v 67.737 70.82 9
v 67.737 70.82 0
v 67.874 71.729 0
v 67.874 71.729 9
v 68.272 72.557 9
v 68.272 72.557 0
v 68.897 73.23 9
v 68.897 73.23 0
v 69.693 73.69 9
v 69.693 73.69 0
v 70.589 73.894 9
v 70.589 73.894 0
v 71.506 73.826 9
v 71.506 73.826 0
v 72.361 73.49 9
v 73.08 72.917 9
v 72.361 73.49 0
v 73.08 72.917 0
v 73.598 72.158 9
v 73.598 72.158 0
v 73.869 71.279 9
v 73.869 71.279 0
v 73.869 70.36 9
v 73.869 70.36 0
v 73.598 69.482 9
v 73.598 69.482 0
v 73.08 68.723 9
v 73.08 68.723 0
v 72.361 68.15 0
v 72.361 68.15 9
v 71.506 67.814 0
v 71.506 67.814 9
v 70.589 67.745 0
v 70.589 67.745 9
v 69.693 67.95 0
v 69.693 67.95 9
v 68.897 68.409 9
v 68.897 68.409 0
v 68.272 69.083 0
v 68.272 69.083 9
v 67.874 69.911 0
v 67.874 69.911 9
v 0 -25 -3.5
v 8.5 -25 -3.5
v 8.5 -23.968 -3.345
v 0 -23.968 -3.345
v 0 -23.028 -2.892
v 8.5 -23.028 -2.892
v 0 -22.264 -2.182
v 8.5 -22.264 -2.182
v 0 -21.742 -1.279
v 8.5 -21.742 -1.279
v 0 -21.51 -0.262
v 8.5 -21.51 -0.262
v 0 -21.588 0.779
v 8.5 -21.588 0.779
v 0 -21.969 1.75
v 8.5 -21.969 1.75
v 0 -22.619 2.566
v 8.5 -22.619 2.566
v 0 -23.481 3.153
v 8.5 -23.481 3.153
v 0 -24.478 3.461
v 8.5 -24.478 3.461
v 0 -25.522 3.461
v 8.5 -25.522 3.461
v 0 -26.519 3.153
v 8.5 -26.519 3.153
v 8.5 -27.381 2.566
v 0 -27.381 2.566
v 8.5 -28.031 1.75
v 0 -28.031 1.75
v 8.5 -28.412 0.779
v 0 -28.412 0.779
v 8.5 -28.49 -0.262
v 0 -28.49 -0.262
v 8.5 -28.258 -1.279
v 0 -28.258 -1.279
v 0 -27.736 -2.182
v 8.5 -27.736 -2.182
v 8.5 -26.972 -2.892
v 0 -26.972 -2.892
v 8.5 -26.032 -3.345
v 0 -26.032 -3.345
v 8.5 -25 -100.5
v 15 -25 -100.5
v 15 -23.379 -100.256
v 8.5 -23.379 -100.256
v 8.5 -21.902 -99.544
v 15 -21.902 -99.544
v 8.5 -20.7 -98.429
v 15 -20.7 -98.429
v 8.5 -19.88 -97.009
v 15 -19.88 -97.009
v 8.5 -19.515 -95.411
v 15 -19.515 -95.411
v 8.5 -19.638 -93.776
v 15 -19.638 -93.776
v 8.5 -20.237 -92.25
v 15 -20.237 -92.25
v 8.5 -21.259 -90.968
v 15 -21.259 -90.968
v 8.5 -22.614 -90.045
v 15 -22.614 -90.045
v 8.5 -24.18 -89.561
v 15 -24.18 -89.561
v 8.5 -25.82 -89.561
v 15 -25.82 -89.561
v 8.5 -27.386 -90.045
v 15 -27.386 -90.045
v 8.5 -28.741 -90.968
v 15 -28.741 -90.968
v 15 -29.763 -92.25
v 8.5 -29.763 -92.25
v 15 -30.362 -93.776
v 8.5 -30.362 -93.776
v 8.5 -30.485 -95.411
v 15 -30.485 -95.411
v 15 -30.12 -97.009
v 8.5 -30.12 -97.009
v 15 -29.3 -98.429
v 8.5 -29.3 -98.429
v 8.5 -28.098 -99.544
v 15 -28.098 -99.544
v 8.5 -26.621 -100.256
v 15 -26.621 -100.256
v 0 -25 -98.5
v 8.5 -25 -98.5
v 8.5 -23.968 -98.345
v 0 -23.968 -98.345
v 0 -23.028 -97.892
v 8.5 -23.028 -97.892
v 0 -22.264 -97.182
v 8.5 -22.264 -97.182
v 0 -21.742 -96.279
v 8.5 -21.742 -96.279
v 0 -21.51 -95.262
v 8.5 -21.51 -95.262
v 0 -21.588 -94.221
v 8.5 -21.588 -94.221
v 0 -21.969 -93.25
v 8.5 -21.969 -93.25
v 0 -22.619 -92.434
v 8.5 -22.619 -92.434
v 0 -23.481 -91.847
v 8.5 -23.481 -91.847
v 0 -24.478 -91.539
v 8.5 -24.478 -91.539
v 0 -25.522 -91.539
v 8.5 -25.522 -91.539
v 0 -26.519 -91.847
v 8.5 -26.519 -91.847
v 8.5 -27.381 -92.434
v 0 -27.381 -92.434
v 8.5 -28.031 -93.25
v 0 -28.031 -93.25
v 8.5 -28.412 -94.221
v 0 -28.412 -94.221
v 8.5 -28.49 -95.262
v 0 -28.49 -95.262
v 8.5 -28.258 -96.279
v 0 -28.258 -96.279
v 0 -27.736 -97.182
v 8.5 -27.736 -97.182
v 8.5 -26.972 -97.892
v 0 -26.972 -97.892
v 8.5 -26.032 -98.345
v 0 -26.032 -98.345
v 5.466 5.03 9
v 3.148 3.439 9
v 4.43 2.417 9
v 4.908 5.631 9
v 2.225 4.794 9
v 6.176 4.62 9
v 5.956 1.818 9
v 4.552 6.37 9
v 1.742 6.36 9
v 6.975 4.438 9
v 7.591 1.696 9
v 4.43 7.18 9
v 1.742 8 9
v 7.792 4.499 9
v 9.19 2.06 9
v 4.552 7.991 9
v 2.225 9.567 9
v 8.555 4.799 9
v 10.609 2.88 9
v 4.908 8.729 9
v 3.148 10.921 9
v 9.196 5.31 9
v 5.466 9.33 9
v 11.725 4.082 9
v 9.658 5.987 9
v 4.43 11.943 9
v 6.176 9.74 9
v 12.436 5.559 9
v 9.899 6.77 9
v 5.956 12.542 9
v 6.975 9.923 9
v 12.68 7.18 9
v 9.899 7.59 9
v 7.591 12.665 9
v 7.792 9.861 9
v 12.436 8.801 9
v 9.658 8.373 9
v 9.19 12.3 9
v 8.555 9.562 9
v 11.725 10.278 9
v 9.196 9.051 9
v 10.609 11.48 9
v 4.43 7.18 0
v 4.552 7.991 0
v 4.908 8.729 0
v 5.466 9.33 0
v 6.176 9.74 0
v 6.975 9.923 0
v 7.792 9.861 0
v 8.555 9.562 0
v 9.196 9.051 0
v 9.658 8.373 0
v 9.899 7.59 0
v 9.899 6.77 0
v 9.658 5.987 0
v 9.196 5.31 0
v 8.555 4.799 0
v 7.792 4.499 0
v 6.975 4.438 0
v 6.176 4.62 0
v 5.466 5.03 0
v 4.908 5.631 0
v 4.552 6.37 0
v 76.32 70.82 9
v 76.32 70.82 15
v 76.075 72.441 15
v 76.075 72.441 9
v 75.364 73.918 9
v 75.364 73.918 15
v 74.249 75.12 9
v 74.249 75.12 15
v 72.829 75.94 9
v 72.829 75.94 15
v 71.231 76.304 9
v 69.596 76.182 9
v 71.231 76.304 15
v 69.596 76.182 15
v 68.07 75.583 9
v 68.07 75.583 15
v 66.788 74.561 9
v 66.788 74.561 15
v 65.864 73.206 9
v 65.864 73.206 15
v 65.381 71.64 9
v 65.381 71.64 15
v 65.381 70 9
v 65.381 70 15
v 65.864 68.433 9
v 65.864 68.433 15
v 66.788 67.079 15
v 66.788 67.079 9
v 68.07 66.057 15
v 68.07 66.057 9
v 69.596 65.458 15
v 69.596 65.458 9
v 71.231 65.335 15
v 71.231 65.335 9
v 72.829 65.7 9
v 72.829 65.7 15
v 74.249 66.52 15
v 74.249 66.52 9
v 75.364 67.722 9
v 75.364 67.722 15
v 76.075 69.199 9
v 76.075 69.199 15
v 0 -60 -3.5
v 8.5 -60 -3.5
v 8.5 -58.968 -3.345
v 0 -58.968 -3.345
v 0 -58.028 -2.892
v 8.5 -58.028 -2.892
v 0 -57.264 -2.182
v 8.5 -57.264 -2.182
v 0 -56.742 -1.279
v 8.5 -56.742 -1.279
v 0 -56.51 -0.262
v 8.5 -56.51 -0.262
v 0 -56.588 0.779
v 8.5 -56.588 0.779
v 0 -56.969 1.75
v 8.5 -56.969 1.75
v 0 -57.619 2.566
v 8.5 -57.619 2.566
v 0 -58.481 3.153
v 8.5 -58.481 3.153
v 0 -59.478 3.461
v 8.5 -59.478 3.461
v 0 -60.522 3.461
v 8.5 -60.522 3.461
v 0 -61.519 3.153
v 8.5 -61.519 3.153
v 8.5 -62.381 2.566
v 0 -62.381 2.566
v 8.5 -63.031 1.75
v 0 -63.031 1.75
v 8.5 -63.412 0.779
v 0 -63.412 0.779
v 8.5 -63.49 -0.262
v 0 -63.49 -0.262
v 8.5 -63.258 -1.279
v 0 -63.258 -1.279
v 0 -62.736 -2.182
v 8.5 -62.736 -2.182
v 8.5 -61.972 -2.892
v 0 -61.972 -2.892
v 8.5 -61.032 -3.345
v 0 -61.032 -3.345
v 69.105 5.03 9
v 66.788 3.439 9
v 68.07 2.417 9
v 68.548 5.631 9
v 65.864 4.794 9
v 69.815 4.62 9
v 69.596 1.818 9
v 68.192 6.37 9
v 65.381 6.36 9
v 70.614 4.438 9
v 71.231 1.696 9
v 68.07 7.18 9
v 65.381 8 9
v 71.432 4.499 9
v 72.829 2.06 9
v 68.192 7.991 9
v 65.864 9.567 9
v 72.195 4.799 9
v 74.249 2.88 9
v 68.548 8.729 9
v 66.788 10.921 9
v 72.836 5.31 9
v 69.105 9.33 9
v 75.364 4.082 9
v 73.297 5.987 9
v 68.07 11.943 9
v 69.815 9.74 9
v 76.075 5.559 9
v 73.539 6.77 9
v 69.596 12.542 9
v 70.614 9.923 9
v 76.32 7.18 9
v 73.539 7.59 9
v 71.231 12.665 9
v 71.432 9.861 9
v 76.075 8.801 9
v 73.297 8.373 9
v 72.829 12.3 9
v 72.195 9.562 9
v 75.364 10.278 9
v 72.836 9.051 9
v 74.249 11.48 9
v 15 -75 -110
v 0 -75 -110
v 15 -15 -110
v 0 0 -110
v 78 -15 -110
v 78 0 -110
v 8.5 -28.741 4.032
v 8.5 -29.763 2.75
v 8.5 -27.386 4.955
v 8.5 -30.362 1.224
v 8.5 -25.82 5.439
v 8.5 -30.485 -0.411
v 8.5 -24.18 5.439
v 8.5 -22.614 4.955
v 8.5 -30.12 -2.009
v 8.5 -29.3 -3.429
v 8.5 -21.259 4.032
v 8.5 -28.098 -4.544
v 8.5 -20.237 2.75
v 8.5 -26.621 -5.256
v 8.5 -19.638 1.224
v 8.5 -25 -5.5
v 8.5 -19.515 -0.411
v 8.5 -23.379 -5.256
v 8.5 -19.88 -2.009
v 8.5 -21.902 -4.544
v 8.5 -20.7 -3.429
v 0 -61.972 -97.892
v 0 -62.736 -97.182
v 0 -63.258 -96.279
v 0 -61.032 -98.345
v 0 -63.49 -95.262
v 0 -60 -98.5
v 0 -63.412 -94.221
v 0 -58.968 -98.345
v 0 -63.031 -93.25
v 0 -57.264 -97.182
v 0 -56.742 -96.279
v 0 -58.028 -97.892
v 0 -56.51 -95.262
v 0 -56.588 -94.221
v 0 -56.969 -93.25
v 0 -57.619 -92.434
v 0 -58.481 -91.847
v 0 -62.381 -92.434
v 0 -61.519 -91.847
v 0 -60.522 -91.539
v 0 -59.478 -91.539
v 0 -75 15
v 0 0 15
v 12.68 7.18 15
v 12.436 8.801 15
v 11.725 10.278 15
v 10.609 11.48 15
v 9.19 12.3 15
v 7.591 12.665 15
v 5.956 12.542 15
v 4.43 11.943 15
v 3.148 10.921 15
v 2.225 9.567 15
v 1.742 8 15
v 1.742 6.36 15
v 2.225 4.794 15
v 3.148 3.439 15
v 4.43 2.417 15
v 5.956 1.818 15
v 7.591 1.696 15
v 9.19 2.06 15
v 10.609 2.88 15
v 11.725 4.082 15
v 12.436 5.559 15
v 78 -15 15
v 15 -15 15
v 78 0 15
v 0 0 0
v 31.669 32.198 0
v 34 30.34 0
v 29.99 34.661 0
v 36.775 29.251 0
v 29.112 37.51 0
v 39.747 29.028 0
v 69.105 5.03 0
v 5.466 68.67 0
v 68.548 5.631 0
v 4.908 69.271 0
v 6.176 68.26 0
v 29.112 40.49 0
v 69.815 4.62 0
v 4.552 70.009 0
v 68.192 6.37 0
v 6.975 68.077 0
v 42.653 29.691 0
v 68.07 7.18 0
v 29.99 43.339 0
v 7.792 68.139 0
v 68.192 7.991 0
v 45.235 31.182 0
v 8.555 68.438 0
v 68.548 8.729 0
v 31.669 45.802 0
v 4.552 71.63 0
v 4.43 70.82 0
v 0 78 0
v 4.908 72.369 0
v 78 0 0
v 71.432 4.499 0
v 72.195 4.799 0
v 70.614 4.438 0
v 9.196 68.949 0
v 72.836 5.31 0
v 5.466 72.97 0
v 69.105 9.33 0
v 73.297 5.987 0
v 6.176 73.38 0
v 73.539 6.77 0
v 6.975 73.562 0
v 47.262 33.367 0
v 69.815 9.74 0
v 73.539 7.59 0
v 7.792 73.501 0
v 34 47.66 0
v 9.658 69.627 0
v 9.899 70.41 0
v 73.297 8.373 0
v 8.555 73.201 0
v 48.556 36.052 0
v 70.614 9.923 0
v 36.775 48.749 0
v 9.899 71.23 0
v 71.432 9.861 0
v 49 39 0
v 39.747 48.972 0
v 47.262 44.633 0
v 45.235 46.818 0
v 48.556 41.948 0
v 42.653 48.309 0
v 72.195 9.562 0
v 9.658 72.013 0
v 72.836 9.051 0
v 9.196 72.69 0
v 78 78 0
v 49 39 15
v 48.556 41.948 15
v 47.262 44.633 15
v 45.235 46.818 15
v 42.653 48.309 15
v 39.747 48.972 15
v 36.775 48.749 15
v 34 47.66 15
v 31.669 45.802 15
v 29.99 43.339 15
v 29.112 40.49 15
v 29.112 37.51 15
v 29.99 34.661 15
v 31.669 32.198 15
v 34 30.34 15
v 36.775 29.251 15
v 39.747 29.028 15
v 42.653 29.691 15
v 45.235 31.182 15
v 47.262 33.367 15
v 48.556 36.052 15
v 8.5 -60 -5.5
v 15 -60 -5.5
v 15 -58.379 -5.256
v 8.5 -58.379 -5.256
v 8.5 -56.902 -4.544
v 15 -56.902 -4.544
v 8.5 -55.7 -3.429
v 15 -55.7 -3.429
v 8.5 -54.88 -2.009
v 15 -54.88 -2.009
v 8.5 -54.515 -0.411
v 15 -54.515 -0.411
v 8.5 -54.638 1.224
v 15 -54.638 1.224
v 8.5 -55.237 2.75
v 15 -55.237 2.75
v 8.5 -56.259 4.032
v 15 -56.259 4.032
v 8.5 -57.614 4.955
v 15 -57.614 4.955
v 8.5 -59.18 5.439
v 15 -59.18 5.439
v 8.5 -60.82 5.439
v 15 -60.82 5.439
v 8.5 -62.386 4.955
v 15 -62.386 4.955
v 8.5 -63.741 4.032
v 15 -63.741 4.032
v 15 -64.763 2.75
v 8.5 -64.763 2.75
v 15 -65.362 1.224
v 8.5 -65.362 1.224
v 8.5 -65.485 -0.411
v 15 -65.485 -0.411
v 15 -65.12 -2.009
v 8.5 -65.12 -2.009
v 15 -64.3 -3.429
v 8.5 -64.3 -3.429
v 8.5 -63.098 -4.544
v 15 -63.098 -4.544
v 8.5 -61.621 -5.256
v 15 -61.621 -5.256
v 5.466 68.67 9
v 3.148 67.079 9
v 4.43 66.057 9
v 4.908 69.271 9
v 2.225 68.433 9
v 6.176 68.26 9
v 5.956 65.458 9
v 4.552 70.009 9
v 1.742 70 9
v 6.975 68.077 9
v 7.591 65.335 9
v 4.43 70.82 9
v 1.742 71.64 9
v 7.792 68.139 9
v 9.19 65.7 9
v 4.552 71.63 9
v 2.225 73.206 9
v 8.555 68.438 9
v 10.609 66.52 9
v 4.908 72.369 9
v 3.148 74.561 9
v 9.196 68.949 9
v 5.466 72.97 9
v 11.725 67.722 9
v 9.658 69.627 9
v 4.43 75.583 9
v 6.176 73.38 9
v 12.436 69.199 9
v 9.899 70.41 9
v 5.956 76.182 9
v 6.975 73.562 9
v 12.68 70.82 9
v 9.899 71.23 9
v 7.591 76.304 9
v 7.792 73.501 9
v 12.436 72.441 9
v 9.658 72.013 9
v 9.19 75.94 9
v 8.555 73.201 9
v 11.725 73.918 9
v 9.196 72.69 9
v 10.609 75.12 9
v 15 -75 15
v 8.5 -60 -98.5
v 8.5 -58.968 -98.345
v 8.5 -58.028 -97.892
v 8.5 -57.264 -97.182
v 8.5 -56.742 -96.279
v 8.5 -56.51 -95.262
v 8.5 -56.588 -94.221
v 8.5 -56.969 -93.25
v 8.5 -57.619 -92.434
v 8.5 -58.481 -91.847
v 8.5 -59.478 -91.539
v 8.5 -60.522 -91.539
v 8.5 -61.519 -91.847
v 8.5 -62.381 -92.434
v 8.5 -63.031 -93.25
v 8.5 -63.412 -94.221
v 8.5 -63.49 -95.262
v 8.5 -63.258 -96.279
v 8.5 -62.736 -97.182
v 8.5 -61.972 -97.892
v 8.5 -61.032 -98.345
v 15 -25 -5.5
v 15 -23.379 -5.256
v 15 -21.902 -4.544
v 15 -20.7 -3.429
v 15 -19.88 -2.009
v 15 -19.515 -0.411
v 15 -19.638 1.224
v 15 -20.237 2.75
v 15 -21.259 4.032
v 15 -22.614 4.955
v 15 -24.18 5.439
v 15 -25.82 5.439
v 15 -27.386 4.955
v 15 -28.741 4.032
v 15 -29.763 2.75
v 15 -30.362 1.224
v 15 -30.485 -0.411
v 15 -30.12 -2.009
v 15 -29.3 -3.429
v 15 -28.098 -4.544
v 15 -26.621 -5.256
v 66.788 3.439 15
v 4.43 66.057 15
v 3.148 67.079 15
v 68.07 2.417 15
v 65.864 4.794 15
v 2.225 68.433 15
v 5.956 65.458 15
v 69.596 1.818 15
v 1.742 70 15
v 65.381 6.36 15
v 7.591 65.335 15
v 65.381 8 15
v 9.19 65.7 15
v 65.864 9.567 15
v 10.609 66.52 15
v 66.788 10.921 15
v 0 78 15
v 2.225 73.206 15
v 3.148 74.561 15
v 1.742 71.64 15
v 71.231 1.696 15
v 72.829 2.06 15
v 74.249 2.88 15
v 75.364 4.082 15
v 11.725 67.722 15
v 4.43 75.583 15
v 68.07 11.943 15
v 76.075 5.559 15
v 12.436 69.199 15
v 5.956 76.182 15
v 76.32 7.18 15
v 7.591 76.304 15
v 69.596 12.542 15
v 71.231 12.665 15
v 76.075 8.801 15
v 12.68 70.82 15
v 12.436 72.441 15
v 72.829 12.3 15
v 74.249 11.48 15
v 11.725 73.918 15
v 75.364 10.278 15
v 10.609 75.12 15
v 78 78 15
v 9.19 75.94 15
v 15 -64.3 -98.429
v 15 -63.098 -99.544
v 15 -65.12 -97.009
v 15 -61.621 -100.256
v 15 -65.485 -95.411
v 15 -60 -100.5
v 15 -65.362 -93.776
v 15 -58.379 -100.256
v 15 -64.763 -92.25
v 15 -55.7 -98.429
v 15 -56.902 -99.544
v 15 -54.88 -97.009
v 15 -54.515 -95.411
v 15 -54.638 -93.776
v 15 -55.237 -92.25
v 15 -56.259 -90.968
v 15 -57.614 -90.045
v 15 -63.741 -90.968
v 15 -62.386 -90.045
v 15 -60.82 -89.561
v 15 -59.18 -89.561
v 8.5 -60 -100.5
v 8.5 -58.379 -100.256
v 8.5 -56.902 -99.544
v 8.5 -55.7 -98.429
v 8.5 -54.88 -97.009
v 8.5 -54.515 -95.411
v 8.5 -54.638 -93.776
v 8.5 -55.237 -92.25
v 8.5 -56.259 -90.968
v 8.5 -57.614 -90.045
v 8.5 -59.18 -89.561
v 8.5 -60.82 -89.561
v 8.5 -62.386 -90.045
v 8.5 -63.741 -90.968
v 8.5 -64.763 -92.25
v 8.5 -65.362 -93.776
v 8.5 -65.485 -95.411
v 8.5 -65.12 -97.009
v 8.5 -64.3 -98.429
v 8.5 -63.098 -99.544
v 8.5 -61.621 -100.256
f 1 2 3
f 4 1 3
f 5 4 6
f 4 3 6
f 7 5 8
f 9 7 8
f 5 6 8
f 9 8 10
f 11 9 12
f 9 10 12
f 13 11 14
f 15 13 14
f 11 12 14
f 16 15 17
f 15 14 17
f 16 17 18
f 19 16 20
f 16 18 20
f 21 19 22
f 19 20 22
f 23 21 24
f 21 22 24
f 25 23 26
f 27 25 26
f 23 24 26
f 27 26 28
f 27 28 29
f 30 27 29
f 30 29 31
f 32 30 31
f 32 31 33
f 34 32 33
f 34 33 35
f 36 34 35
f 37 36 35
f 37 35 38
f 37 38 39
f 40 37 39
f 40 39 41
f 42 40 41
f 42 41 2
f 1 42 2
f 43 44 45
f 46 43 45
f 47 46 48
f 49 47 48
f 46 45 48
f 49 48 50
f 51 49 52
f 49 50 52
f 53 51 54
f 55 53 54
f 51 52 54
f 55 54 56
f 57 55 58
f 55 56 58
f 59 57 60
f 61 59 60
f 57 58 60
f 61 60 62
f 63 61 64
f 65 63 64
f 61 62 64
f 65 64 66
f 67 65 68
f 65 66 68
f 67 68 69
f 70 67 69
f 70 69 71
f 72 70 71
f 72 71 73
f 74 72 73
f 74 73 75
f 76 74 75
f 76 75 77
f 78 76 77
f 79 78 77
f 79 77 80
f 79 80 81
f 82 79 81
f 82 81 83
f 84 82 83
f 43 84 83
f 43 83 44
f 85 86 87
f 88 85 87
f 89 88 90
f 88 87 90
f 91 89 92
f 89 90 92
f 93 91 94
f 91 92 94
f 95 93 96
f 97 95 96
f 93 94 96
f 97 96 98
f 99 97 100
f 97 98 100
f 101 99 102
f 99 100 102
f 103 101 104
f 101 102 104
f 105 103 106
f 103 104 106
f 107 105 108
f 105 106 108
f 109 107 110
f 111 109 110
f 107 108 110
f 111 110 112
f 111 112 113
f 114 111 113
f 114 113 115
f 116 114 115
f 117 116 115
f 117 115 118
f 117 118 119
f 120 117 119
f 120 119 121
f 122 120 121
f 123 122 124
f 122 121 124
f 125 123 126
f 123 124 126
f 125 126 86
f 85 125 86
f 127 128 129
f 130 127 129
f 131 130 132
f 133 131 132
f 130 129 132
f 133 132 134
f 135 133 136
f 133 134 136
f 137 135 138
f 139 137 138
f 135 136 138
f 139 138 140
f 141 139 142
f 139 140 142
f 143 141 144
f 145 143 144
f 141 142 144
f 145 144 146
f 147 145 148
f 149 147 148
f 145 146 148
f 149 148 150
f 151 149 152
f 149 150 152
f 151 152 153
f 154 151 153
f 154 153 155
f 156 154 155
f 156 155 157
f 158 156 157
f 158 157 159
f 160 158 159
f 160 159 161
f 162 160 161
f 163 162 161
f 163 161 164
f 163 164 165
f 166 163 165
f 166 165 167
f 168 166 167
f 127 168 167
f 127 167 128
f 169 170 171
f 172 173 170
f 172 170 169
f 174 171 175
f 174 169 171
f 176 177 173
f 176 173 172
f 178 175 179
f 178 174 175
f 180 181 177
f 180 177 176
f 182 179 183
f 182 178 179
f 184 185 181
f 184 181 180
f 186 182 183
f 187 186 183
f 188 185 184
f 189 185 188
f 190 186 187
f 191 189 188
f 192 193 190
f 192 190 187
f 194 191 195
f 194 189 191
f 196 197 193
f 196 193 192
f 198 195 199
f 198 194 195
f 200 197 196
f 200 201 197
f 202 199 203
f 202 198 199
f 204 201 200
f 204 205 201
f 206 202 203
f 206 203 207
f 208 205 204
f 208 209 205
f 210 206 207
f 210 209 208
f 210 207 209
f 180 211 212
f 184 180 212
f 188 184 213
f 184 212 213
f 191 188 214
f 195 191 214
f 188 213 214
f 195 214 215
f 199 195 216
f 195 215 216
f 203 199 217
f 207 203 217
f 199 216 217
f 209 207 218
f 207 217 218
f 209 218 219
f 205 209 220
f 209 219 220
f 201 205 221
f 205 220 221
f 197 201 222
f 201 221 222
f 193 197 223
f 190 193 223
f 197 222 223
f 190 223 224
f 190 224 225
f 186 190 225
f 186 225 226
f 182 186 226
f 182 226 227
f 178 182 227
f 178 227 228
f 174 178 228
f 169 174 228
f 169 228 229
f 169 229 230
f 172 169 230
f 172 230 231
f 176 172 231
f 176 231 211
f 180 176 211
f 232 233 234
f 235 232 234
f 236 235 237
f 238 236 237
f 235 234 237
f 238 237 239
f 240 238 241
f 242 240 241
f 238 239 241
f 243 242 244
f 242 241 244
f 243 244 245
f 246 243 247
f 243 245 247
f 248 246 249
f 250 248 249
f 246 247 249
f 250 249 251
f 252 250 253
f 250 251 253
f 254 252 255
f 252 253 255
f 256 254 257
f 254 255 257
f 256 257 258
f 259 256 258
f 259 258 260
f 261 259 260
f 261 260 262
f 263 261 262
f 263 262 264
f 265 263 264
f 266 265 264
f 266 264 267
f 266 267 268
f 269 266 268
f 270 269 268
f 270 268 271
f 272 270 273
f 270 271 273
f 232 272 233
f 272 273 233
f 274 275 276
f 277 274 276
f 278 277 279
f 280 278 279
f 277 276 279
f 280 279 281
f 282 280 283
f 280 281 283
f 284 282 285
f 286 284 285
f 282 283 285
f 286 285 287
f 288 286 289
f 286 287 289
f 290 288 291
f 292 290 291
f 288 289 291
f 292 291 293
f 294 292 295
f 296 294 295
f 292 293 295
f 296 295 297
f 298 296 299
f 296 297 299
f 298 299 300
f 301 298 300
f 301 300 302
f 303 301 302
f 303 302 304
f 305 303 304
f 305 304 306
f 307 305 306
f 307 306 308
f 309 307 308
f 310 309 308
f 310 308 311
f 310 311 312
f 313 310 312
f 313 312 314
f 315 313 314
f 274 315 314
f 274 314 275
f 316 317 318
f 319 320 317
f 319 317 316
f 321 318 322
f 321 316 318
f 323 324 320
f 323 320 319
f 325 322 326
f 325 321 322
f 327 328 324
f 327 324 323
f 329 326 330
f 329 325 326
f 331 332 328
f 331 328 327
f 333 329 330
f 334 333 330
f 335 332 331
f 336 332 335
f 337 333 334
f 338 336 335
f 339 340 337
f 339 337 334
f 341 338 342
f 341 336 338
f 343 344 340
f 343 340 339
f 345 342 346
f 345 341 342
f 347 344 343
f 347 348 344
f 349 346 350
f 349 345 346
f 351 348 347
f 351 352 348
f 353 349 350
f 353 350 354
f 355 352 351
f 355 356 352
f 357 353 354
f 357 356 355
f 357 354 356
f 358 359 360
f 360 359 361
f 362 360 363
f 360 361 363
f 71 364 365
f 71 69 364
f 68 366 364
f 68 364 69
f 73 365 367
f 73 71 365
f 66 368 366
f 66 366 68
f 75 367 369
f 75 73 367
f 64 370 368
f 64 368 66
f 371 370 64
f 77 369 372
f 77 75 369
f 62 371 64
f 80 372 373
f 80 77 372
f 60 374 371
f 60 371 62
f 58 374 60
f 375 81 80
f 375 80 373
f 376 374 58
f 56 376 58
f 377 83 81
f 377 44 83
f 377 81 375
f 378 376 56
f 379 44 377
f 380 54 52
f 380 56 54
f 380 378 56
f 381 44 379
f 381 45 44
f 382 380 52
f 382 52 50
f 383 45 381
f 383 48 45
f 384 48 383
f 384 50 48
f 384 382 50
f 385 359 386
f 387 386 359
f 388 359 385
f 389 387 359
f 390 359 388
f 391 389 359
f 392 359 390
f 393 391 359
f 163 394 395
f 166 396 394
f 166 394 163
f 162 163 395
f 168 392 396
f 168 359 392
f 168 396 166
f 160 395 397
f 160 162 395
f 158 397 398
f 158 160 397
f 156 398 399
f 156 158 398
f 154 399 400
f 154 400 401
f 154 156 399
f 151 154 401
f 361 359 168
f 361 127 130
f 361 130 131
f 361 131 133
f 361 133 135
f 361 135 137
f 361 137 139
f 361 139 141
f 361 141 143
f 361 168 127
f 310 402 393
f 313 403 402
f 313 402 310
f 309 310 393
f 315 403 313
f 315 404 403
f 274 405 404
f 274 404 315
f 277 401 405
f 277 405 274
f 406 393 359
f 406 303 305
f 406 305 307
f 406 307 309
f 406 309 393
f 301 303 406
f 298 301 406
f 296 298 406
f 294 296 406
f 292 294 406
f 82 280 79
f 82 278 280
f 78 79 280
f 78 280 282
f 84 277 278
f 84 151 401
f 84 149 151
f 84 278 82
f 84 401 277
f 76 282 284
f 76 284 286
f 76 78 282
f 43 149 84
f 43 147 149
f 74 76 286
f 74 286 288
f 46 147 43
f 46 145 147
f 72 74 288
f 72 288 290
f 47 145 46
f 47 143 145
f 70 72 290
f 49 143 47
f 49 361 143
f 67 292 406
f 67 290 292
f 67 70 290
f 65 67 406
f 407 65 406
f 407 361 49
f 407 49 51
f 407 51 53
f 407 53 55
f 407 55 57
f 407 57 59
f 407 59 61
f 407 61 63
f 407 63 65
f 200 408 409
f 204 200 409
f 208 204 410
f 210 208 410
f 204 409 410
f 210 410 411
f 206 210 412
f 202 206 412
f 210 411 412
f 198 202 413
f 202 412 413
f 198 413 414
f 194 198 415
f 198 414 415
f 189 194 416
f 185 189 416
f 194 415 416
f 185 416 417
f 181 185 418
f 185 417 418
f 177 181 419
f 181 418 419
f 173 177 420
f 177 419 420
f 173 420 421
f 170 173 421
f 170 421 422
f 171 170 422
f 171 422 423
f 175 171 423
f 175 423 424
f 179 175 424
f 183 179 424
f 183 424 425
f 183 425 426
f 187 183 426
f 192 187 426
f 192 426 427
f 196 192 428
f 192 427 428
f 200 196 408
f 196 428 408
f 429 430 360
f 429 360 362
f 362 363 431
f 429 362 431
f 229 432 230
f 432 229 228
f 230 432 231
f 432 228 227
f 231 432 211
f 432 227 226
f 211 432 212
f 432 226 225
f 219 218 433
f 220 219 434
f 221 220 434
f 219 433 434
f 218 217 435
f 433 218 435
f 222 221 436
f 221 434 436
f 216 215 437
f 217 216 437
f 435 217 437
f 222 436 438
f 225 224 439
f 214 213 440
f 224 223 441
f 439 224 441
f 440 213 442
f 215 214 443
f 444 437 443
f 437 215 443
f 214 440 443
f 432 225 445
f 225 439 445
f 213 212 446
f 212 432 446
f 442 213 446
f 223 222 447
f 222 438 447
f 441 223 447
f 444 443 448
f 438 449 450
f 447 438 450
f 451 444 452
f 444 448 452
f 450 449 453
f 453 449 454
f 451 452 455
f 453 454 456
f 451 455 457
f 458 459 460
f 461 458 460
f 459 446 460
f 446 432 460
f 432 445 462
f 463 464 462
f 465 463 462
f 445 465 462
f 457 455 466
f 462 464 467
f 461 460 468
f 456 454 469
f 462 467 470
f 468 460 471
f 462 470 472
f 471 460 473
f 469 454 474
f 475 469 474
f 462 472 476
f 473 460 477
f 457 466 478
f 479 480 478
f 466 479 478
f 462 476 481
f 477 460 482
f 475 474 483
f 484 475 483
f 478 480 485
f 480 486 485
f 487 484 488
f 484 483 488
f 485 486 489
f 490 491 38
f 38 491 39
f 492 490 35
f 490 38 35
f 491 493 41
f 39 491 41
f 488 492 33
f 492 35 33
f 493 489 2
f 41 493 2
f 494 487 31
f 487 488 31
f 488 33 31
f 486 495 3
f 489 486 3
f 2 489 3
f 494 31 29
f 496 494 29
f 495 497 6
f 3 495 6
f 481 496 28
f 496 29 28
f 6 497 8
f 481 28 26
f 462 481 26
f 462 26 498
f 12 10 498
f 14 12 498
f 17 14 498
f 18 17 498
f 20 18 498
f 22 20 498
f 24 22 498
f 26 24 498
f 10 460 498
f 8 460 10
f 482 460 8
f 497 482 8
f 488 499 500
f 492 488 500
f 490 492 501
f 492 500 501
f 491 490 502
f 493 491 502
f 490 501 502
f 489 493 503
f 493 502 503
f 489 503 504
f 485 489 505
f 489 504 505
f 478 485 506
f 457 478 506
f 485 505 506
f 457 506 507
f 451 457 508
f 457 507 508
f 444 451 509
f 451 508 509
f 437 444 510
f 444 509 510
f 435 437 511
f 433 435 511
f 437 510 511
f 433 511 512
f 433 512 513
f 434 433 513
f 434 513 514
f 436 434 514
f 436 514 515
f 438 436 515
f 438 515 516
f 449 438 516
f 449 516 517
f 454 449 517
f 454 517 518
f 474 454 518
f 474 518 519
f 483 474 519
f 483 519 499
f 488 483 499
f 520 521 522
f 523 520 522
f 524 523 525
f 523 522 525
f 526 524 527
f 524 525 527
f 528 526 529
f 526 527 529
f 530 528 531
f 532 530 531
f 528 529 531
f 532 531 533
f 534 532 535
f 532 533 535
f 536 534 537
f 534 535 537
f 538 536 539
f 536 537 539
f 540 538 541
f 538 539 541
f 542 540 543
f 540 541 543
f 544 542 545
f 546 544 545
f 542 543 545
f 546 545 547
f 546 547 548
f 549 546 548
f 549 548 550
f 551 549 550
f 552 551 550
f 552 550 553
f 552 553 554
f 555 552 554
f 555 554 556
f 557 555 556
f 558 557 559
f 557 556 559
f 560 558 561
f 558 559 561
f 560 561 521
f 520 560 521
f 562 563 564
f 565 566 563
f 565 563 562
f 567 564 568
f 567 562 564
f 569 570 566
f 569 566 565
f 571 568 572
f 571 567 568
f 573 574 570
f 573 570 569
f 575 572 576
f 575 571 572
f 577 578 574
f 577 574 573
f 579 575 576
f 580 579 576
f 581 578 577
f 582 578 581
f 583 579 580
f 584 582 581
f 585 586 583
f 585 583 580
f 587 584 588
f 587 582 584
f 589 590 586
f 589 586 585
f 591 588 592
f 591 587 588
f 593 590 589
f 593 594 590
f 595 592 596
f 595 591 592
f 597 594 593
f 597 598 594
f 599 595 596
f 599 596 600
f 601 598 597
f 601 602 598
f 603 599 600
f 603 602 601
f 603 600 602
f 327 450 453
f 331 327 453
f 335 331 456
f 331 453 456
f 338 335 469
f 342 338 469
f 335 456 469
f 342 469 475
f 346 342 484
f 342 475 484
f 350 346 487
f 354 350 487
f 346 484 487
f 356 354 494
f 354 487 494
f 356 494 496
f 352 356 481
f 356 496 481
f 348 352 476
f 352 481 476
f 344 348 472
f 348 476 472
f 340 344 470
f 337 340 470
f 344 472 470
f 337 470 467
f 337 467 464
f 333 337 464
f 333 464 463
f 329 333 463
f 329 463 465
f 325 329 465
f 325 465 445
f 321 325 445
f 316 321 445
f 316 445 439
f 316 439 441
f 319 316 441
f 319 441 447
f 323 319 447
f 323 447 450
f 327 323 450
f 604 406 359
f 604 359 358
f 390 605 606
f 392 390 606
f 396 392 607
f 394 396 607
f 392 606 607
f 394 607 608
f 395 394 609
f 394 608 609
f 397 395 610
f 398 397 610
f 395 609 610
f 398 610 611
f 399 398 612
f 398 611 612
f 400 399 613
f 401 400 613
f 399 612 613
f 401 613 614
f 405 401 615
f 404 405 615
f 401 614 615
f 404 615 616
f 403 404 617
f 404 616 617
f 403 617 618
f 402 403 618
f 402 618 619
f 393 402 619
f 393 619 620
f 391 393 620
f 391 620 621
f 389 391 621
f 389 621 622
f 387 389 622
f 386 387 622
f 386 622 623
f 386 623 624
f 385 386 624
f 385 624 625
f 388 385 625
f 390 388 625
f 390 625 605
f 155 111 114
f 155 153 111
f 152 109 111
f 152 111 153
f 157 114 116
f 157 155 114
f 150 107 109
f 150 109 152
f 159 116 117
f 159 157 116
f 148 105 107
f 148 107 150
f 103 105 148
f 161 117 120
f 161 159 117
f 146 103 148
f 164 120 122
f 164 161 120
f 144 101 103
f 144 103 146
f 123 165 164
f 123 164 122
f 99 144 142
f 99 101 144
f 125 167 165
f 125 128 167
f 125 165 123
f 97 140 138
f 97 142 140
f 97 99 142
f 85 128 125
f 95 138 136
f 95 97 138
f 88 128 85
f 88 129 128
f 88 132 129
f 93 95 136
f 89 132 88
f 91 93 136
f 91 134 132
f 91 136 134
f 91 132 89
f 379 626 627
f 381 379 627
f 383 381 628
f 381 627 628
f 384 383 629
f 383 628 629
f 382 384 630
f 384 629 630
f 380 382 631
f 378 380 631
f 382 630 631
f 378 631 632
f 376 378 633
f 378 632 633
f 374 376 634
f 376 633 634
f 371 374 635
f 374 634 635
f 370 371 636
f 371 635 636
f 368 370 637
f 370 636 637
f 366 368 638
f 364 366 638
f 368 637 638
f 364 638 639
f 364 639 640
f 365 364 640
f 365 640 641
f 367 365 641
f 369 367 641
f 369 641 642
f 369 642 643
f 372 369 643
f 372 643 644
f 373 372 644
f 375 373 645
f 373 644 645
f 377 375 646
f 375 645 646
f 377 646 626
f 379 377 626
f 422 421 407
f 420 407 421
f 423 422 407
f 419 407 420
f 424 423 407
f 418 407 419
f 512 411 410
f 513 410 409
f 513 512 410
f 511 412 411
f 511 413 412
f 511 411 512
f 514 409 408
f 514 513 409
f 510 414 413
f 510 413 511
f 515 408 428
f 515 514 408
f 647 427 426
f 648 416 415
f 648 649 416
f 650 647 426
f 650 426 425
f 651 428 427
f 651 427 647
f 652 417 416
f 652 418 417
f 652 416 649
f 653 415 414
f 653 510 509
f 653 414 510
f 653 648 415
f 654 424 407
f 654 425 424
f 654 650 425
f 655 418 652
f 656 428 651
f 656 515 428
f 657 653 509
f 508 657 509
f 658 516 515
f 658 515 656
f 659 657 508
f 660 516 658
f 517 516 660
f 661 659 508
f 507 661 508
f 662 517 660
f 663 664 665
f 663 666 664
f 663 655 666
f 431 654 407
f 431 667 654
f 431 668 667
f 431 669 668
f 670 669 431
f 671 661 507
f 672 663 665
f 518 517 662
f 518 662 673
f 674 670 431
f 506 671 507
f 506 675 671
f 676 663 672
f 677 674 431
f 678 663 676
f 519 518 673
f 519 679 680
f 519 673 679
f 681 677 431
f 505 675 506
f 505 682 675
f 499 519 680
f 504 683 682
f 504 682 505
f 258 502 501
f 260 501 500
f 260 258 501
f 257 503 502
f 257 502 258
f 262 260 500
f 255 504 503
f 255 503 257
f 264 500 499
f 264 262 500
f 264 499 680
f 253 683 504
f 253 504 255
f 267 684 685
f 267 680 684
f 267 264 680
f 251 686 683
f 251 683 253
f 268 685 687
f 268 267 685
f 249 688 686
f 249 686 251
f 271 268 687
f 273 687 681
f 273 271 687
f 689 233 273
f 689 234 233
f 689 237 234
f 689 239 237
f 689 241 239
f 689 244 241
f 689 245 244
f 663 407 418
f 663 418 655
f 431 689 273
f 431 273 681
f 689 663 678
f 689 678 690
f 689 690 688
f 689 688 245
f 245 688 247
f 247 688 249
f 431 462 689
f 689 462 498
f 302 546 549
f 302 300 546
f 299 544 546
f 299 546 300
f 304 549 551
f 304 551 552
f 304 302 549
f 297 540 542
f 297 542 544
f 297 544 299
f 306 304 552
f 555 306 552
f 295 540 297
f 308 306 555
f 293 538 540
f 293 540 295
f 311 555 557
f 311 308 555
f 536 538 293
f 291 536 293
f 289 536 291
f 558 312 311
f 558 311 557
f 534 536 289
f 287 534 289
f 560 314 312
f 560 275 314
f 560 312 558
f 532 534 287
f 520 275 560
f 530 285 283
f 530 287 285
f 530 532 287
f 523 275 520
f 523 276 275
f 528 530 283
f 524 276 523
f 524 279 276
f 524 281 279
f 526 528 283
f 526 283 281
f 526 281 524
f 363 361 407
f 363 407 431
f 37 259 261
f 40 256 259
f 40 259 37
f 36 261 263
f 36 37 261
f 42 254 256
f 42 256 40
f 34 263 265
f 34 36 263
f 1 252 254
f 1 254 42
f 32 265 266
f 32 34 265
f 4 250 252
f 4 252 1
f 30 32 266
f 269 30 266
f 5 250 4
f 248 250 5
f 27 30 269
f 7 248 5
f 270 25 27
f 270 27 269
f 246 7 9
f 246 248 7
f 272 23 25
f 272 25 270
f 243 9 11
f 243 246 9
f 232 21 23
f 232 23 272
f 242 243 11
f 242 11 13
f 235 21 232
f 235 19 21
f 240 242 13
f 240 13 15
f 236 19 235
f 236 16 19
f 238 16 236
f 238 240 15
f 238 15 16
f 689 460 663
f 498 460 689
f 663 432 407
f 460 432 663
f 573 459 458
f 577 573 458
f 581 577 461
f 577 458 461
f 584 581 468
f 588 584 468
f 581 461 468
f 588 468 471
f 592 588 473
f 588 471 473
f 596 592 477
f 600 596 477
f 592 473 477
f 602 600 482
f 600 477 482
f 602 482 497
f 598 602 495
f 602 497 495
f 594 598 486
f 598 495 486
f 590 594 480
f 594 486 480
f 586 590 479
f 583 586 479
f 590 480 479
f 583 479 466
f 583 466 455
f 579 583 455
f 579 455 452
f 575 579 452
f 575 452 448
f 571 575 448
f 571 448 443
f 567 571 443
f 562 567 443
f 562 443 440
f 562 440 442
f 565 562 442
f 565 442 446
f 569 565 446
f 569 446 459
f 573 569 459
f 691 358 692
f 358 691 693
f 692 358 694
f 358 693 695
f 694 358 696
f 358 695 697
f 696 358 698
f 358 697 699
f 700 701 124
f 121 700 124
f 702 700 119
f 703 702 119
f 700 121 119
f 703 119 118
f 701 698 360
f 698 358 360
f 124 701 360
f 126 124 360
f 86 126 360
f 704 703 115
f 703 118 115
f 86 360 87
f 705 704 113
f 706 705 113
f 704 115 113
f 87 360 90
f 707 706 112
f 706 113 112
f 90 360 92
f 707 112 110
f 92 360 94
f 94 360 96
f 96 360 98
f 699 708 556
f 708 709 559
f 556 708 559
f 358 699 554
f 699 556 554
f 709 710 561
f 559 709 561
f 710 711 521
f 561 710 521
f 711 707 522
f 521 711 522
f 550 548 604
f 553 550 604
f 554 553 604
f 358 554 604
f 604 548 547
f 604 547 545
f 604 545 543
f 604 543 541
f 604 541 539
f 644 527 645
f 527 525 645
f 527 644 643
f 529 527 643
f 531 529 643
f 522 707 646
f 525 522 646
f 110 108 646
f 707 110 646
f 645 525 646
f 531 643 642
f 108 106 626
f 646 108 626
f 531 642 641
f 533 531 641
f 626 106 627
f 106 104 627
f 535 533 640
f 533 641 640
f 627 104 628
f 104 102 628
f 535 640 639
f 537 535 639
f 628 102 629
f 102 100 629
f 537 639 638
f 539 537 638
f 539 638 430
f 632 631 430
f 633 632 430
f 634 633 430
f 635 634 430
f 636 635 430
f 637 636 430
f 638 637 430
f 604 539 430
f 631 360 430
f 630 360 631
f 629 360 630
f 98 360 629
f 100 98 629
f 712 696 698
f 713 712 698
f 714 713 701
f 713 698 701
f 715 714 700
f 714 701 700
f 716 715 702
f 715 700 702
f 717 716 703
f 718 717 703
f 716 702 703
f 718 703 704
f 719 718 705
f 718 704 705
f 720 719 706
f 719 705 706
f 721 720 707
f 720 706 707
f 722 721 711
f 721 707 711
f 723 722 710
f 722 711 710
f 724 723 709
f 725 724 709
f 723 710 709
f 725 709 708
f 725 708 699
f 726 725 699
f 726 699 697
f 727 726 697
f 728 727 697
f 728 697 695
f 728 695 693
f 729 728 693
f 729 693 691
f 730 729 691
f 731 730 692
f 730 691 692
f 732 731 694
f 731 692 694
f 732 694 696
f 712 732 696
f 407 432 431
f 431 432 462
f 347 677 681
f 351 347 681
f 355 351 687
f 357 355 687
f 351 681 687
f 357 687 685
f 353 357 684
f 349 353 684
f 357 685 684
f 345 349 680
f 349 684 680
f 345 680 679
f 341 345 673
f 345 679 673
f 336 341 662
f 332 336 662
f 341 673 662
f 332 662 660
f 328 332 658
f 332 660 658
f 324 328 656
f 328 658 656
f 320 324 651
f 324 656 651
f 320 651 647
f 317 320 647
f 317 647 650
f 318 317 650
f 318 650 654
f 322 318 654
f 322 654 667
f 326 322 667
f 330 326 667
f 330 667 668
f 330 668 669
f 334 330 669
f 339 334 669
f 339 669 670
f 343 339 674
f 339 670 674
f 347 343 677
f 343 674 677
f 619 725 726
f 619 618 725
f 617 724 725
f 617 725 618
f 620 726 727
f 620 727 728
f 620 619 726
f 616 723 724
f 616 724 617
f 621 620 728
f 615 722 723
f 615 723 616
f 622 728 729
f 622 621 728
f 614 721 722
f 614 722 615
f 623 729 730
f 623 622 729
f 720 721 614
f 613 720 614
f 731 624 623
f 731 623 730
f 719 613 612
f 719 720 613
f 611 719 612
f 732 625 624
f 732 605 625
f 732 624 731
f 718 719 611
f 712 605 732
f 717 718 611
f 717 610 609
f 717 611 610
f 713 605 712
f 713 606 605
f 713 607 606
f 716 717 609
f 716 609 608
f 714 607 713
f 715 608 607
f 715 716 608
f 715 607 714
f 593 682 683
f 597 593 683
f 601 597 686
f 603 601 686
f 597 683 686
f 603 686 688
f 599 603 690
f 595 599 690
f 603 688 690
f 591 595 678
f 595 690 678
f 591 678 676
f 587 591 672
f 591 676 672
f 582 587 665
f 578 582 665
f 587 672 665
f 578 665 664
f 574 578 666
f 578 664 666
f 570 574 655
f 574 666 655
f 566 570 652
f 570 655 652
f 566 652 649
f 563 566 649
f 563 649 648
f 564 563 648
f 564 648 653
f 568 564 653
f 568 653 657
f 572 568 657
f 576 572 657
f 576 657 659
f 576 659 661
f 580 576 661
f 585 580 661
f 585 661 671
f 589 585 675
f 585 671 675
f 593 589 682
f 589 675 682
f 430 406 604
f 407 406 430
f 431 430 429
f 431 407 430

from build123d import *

# Parameters (mm, degrees)
SKETCH_1_W          = 78
SKETCH_1_H          = 78
EXTRUDE_1_DEPTH     = 15
SKETCH_2_W          = 78
SKETCH_2_H          = 125
EXTRUDE_2_DEPTH     = 15
SKETCH_3_W          = 15
SKETCH_3_H          = 125
EXTRUDE_3_DEPTH     = 60
SKETCH_4_R          = 3.083261121
SKETCH_4_R_2        = 2.75
CUT_EXTRUDE_1_DEPTH = 156.78189882
SKETCH_5_R          = 10
CUT_EXTRUDE_2_DEPTH = 60
SKETCH_6_R          = 5.5
CUT_EXTRUDE_3_DEPTH = 6
SKETCH_7_R          = 3.5
CUT_EXTRUDE_4_DEPTH = 149.838839017
SKETCH_8_R          = 5.5
CUT_EXTRUDE_5_DEPTH = 6.5


with BuildPart() as part:
    # 草图1 → 凸台-拉伸1 (new body)
    with BuildSketch(Plane.XY):
        with Locations((39, 39)):
            Rectangle(SKETCH_1_W, SKETCH_1_H)
    extrude(amount=EXTRUDE_1_DEPTH)

    # 草图4 → 切除-拉伸1 (cut, through all)
    with BuildSketch(Plane(origin=(0, 0, 0), x_dir=(-1, 0, 0), z_dir=(0, 0, -1))):
        with Locations((-70.819805153, 70.819805153)):
            Circle(SKETCH_4_R)
        with Locations((-70.819805153, 7.180194847)):
            Circle(SKETCH_4_R_2)
        with Locations((-7.180194847, 70.819805153)):
            Circle(SKETCH_4_R_2)
        with Locations((-7.180194847, 7.180194847)):
            Circle(SKETCH_4_R_2)
    extrude(amount=-CUT_EXTRUDE_1_DEPTH, mode=Mode.SUBTRACT)

    # 草图5 → 切除-拉伸2 (cut)
    with BuildSketch(Plane.XY.offset(15)):
        with Locations((39, 39)):
            Circle(SKETCH_5_R)
    extrude(amount=-CUT_EXTRUDE_2_DEPTH, mode=Mode.SUBTRACT)

    # 草图6 → 切除-拉伸3 (cut)
    with BuildSketch(Plane.XY.offset(15)):
        with Locations((7.180194847, 70.819805153)):
            Circle(SKETCH_6_R)
        with Locations((7.180194847, 7.180194847)):
            Circle(SKETCH_6_R)
        with Locations((70.819805153, 7.180194847)):
            Circle(SKETCH_6_R)
        with Locations((70.819805153, 70.819805153)):
            Circle(SKETCH_6_R)
    extrude(amount=-CUT_EXTRUDE_3_DEPTH, mode=Mode.SUBTRACT)


with BuildPart() as body_2:
    # 草图2 → 凸台-拉伸2 (new body)
    with BuildSketch(Plane.XZ):
        with Locations((39, -47.5)):
            Rectangle(SKETCH_2_W, SKETCH_2_H)
    extrude(amount=EXTRUDE_2_DEPTH)

    # 草图3 → 凸台-拉伸3 (add)
    with BuildSketch(Plane.XZ.offset(15)):
        with Locations((7.5, -47.5)):
            Rectangle(SKETCH_3_W, SKETCH_3_H)
    extrude(amount=EXTRUDE_3_DEPTH)

    # 草图7 → 切除-拉伸4 (cut, through all)
    with BuildSketch(Plane(origin=(15, 0, 0), x_dir=(0, 0, -1), z_dir=(1, 0, 0))):
        with Locations((0, -25)):
            Circle(SKETCH_7_R)
        with Locations((95, -25)):
            Circle(SKETCH_7_R)
        with Locations((0, -60)):
            Circle(SKETCH_7_R)
        with Locations((95, -60)):
            Circle(SKETCH_7_R)
    extrude(amount=-CUT_EXTRUDE_4_DEPTH, mode=Mode.SUBTRACT)

    # 草图8 → 切除-拉伸5 (cut)
    with BuildSketch(Plane(origin=(15, 0, 0), x_dir=(0, 0, -1), z_dir=(1, 0, 0))):
        with Locations((0, -25)):
            Circle(SKETCH_8_R)
        with Locations((0, -60)):
            Circle(SKETCH_8_R)
        with Locations((95, -60)):
            Circle(SKETCH_8_R)
        with Locations((95, -25)):
            Circle(SKETCH_8_R)
    extrude(amount=-CUT_EXTRUDE_5_DEPTH, mode=Mode.SUBTRACT)


solid = Compound([part.part, body_2.part])
